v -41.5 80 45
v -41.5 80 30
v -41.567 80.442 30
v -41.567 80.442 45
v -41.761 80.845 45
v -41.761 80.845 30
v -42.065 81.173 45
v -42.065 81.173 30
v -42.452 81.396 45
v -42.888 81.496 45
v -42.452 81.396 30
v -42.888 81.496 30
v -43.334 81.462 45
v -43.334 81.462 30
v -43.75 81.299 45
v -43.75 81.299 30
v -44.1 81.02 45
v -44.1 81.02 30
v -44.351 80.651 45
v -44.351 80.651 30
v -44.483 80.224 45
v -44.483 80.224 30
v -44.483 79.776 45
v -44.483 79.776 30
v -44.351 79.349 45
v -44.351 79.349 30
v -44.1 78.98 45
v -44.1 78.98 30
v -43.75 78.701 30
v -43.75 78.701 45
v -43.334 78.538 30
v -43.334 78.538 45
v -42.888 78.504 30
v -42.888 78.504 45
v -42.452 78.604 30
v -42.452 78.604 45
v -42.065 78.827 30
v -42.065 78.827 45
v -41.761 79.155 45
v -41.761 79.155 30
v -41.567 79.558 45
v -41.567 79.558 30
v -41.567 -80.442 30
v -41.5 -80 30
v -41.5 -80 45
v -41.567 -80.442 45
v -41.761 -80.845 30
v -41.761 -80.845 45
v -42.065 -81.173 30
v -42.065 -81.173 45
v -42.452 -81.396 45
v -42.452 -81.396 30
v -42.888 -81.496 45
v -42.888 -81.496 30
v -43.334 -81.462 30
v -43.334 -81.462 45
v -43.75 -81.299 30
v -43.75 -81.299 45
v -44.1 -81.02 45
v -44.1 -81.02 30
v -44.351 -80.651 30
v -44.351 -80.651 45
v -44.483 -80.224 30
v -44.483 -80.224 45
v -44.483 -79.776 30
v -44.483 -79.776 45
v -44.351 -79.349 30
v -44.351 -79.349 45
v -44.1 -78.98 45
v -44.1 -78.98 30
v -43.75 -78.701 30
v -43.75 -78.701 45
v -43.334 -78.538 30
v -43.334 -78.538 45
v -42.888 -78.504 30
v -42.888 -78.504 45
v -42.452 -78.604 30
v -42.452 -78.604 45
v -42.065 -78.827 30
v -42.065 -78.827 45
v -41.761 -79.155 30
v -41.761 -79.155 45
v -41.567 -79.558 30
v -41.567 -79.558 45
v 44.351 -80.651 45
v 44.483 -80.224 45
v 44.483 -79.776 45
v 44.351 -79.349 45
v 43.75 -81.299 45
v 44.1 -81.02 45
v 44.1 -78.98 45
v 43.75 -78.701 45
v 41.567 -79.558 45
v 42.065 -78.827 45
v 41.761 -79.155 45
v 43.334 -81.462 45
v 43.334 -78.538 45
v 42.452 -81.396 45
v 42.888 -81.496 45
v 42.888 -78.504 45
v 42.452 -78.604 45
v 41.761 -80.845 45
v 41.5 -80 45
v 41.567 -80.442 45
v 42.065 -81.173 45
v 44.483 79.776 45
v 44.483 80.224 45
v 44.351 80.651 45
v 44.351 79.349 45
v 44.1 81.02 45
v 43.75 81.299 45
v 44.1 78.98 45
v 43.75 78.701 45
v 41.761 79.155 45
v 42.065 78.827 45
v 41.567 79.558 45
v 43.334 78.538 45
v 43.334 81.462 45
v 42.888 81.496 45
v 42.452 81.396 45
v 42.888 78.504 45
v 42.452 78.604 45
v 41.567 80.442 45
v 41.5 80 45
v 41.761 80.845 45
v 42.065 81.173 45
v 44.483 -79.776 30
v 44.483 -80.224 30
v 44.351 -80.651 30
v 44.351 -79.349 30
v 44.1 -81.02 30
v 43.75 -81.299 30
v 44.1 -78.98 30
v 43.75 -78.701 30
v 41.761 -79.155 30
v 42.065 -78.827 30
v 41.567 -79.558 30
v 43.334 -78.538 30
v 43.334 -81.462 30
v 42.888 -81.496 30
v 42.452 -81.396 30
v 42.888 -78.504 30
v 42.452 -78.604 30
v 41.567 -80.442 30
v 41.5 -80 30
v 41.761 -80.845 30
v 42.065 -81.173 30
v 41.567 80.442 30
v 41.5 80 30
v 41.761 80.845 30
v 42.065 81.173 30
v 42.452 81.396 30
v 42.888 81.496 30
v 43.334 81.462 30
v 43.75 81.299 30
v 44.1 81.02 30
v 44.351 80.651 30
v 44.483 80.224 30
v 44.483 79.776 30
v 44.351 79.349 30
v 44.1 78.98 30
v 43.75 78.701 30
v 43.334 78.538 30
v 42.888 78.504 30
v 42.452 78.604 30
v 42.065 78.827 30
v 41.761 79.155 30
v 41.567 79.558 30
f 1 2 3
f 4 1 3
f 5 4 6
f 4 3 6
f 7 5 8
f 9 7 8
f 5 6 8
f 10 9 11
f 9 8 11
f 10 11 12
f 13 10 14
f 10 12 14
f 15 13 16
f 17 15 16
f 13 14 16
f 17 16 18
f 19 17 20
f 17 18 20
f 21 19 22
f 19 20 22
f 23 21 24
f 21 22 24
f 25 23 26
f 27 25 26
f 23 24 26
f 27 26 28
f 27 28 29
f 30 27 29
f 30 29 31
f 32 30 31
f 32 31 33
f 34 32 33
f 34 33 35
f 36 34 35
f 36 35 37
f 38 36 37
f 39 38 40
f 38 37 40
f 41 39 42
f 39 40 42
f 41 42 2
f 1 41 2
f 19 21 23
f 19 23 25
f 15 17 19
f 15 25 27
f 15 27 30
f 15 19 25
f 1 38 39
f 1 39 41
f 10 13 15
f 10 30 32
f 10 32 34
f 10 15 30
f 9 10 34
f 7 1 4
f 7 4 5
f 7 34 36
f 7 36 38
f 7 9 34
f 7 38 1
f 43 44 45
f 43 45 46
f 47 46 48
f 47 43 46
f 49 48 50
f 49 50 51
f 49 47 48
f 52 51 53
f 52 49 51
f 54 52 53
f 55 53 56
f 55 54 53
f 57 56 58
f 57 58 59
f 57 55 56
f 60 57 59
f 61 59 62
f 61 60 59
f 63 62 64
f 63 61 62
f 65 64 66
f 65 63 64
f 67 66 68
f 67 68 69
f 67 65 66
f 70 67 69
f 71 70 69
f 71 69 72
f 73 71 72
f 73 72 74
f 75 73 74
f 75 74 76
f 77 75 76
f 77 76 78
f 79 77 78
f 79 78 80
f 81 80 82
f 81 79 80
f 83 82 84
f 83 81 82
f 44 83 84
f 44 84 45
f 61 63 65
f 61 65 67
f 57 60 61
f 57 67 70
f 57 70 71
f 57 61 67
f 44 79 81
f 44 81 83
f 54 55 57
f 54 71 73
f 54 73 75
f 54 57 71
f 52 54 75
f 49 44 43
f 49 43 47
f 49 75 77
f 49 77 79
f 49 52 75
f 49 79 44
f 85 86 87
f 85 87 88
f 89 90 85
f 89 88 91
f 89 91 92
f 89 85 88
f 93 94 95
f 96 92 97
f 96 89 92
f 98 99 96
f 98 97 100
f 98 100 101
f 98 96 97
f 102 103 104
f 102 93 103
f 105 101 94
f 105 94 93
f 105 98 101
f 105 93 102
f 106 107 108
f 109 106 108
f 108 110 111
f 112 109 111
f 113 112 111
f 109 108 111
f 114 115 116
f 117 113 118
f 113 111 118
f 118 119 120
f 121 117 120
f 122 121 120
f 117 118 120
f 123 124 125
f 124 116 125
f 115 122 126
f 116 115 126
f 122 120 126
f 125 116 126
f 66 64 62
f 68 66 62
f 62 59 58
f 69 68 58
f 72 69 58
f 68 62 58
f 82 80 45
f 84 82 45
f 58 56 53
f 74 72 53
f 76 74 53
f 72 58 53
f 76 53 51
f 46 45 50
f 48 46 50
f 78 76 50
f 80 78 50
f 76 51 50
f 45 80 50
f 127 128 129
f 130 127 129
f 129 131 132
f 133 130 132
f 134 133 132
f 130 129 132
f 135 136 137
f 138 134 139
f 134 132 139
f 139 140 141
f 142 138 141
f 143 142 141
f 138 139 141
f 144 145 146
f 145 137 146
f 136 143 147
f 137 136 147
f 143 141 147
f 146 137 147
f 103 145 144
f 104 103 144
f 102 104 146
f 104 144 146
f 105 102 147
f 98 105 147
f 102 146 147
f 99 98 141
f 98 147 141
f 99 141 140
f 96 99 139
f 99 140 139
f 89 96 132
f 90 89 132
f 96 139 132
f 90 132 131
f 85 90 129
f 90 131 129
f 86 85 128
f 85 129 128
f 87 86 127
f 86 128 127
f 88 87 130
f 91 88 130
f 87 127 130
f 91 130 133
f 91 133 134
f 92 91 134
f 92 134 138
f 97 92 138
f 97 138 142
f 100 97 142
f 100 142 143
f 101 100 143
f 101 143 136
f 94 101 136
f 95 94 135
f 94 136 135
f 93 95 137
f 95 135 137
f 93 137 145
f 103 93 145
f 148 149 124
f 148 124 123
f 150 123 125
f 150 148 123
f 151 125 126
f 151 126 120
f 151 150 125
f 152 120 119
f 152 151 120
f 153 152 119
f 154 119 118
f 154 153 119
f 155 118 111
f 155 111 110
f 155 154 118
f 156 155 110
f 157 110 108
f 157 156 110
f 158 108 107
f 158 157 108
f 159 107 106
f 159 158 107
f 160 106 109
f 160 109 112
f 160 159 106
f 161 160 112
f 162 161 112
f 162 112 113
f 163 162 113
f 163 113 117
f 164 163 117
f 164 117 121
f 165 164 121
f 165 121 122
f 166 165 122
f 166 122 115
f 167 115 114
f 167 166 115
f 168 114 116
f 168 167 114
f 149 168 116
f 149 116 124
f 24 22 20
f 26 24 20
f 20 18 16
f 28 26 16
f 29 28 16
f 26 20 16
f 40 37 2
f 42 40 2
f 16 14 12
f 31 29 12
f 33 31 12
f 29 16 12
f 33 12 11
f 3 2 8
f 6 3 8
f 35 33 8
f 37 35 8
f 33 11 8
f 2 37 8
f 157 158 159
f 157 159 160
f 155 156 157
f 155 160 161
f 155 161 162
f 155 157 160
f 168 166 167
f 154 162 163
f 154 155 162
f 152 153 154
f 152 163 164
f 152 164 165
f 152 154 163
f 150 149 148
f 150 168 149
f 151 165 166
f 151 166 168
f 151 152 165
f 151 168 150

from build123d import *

# Parameters (mm, degrees)
CYLINDER006_R     = 1.5
CYLINDER006_DEPTH = 15


with BuildPart() as rellenados001:
    # Cylinder006 → Cylinder006 (new body)
    with BuildSketch(Plane(origin=(-43, 80, 30), x_dir=(1, 0, 0), z_dir=(0, 0, 1))):
        Circle(CYLINDER006_R)
    extrude(amount=CYLINDER006_DEPTH)


with BuildPart() as part_mirroring:
    # Part__Mirroring: instance of rellenados001
    add(rellenados001.part.mirror(Plane(origin=(0, 0, 0), x_dir=(1, 0, 0), z_dir=(0, 1, 0))))


with BuildPart() as fusion:
    # Fusion base: copy of rellenados001
    add(rellenados001.part)

    # Fusion: union Part__Mirroring
    add(part_mirroring.part)


with BuildPart() as part_mirroring018:
    # Part__Mirroring018: instance of Fusion
    add(fusion.part.mirror(Plane(origin=(0, 0, 0), x_dir=(0, -1, 0), z_dir=(1, 0, 0))))


with BuildPart() as posicion_roscas:
    # Fusion001044 base: copy of Fusion
    add(fusion.part)

    # Fusion001044: union Part__Mirroring018
    add(part_mirroring018.part)


solid = posicion_roscas.part
